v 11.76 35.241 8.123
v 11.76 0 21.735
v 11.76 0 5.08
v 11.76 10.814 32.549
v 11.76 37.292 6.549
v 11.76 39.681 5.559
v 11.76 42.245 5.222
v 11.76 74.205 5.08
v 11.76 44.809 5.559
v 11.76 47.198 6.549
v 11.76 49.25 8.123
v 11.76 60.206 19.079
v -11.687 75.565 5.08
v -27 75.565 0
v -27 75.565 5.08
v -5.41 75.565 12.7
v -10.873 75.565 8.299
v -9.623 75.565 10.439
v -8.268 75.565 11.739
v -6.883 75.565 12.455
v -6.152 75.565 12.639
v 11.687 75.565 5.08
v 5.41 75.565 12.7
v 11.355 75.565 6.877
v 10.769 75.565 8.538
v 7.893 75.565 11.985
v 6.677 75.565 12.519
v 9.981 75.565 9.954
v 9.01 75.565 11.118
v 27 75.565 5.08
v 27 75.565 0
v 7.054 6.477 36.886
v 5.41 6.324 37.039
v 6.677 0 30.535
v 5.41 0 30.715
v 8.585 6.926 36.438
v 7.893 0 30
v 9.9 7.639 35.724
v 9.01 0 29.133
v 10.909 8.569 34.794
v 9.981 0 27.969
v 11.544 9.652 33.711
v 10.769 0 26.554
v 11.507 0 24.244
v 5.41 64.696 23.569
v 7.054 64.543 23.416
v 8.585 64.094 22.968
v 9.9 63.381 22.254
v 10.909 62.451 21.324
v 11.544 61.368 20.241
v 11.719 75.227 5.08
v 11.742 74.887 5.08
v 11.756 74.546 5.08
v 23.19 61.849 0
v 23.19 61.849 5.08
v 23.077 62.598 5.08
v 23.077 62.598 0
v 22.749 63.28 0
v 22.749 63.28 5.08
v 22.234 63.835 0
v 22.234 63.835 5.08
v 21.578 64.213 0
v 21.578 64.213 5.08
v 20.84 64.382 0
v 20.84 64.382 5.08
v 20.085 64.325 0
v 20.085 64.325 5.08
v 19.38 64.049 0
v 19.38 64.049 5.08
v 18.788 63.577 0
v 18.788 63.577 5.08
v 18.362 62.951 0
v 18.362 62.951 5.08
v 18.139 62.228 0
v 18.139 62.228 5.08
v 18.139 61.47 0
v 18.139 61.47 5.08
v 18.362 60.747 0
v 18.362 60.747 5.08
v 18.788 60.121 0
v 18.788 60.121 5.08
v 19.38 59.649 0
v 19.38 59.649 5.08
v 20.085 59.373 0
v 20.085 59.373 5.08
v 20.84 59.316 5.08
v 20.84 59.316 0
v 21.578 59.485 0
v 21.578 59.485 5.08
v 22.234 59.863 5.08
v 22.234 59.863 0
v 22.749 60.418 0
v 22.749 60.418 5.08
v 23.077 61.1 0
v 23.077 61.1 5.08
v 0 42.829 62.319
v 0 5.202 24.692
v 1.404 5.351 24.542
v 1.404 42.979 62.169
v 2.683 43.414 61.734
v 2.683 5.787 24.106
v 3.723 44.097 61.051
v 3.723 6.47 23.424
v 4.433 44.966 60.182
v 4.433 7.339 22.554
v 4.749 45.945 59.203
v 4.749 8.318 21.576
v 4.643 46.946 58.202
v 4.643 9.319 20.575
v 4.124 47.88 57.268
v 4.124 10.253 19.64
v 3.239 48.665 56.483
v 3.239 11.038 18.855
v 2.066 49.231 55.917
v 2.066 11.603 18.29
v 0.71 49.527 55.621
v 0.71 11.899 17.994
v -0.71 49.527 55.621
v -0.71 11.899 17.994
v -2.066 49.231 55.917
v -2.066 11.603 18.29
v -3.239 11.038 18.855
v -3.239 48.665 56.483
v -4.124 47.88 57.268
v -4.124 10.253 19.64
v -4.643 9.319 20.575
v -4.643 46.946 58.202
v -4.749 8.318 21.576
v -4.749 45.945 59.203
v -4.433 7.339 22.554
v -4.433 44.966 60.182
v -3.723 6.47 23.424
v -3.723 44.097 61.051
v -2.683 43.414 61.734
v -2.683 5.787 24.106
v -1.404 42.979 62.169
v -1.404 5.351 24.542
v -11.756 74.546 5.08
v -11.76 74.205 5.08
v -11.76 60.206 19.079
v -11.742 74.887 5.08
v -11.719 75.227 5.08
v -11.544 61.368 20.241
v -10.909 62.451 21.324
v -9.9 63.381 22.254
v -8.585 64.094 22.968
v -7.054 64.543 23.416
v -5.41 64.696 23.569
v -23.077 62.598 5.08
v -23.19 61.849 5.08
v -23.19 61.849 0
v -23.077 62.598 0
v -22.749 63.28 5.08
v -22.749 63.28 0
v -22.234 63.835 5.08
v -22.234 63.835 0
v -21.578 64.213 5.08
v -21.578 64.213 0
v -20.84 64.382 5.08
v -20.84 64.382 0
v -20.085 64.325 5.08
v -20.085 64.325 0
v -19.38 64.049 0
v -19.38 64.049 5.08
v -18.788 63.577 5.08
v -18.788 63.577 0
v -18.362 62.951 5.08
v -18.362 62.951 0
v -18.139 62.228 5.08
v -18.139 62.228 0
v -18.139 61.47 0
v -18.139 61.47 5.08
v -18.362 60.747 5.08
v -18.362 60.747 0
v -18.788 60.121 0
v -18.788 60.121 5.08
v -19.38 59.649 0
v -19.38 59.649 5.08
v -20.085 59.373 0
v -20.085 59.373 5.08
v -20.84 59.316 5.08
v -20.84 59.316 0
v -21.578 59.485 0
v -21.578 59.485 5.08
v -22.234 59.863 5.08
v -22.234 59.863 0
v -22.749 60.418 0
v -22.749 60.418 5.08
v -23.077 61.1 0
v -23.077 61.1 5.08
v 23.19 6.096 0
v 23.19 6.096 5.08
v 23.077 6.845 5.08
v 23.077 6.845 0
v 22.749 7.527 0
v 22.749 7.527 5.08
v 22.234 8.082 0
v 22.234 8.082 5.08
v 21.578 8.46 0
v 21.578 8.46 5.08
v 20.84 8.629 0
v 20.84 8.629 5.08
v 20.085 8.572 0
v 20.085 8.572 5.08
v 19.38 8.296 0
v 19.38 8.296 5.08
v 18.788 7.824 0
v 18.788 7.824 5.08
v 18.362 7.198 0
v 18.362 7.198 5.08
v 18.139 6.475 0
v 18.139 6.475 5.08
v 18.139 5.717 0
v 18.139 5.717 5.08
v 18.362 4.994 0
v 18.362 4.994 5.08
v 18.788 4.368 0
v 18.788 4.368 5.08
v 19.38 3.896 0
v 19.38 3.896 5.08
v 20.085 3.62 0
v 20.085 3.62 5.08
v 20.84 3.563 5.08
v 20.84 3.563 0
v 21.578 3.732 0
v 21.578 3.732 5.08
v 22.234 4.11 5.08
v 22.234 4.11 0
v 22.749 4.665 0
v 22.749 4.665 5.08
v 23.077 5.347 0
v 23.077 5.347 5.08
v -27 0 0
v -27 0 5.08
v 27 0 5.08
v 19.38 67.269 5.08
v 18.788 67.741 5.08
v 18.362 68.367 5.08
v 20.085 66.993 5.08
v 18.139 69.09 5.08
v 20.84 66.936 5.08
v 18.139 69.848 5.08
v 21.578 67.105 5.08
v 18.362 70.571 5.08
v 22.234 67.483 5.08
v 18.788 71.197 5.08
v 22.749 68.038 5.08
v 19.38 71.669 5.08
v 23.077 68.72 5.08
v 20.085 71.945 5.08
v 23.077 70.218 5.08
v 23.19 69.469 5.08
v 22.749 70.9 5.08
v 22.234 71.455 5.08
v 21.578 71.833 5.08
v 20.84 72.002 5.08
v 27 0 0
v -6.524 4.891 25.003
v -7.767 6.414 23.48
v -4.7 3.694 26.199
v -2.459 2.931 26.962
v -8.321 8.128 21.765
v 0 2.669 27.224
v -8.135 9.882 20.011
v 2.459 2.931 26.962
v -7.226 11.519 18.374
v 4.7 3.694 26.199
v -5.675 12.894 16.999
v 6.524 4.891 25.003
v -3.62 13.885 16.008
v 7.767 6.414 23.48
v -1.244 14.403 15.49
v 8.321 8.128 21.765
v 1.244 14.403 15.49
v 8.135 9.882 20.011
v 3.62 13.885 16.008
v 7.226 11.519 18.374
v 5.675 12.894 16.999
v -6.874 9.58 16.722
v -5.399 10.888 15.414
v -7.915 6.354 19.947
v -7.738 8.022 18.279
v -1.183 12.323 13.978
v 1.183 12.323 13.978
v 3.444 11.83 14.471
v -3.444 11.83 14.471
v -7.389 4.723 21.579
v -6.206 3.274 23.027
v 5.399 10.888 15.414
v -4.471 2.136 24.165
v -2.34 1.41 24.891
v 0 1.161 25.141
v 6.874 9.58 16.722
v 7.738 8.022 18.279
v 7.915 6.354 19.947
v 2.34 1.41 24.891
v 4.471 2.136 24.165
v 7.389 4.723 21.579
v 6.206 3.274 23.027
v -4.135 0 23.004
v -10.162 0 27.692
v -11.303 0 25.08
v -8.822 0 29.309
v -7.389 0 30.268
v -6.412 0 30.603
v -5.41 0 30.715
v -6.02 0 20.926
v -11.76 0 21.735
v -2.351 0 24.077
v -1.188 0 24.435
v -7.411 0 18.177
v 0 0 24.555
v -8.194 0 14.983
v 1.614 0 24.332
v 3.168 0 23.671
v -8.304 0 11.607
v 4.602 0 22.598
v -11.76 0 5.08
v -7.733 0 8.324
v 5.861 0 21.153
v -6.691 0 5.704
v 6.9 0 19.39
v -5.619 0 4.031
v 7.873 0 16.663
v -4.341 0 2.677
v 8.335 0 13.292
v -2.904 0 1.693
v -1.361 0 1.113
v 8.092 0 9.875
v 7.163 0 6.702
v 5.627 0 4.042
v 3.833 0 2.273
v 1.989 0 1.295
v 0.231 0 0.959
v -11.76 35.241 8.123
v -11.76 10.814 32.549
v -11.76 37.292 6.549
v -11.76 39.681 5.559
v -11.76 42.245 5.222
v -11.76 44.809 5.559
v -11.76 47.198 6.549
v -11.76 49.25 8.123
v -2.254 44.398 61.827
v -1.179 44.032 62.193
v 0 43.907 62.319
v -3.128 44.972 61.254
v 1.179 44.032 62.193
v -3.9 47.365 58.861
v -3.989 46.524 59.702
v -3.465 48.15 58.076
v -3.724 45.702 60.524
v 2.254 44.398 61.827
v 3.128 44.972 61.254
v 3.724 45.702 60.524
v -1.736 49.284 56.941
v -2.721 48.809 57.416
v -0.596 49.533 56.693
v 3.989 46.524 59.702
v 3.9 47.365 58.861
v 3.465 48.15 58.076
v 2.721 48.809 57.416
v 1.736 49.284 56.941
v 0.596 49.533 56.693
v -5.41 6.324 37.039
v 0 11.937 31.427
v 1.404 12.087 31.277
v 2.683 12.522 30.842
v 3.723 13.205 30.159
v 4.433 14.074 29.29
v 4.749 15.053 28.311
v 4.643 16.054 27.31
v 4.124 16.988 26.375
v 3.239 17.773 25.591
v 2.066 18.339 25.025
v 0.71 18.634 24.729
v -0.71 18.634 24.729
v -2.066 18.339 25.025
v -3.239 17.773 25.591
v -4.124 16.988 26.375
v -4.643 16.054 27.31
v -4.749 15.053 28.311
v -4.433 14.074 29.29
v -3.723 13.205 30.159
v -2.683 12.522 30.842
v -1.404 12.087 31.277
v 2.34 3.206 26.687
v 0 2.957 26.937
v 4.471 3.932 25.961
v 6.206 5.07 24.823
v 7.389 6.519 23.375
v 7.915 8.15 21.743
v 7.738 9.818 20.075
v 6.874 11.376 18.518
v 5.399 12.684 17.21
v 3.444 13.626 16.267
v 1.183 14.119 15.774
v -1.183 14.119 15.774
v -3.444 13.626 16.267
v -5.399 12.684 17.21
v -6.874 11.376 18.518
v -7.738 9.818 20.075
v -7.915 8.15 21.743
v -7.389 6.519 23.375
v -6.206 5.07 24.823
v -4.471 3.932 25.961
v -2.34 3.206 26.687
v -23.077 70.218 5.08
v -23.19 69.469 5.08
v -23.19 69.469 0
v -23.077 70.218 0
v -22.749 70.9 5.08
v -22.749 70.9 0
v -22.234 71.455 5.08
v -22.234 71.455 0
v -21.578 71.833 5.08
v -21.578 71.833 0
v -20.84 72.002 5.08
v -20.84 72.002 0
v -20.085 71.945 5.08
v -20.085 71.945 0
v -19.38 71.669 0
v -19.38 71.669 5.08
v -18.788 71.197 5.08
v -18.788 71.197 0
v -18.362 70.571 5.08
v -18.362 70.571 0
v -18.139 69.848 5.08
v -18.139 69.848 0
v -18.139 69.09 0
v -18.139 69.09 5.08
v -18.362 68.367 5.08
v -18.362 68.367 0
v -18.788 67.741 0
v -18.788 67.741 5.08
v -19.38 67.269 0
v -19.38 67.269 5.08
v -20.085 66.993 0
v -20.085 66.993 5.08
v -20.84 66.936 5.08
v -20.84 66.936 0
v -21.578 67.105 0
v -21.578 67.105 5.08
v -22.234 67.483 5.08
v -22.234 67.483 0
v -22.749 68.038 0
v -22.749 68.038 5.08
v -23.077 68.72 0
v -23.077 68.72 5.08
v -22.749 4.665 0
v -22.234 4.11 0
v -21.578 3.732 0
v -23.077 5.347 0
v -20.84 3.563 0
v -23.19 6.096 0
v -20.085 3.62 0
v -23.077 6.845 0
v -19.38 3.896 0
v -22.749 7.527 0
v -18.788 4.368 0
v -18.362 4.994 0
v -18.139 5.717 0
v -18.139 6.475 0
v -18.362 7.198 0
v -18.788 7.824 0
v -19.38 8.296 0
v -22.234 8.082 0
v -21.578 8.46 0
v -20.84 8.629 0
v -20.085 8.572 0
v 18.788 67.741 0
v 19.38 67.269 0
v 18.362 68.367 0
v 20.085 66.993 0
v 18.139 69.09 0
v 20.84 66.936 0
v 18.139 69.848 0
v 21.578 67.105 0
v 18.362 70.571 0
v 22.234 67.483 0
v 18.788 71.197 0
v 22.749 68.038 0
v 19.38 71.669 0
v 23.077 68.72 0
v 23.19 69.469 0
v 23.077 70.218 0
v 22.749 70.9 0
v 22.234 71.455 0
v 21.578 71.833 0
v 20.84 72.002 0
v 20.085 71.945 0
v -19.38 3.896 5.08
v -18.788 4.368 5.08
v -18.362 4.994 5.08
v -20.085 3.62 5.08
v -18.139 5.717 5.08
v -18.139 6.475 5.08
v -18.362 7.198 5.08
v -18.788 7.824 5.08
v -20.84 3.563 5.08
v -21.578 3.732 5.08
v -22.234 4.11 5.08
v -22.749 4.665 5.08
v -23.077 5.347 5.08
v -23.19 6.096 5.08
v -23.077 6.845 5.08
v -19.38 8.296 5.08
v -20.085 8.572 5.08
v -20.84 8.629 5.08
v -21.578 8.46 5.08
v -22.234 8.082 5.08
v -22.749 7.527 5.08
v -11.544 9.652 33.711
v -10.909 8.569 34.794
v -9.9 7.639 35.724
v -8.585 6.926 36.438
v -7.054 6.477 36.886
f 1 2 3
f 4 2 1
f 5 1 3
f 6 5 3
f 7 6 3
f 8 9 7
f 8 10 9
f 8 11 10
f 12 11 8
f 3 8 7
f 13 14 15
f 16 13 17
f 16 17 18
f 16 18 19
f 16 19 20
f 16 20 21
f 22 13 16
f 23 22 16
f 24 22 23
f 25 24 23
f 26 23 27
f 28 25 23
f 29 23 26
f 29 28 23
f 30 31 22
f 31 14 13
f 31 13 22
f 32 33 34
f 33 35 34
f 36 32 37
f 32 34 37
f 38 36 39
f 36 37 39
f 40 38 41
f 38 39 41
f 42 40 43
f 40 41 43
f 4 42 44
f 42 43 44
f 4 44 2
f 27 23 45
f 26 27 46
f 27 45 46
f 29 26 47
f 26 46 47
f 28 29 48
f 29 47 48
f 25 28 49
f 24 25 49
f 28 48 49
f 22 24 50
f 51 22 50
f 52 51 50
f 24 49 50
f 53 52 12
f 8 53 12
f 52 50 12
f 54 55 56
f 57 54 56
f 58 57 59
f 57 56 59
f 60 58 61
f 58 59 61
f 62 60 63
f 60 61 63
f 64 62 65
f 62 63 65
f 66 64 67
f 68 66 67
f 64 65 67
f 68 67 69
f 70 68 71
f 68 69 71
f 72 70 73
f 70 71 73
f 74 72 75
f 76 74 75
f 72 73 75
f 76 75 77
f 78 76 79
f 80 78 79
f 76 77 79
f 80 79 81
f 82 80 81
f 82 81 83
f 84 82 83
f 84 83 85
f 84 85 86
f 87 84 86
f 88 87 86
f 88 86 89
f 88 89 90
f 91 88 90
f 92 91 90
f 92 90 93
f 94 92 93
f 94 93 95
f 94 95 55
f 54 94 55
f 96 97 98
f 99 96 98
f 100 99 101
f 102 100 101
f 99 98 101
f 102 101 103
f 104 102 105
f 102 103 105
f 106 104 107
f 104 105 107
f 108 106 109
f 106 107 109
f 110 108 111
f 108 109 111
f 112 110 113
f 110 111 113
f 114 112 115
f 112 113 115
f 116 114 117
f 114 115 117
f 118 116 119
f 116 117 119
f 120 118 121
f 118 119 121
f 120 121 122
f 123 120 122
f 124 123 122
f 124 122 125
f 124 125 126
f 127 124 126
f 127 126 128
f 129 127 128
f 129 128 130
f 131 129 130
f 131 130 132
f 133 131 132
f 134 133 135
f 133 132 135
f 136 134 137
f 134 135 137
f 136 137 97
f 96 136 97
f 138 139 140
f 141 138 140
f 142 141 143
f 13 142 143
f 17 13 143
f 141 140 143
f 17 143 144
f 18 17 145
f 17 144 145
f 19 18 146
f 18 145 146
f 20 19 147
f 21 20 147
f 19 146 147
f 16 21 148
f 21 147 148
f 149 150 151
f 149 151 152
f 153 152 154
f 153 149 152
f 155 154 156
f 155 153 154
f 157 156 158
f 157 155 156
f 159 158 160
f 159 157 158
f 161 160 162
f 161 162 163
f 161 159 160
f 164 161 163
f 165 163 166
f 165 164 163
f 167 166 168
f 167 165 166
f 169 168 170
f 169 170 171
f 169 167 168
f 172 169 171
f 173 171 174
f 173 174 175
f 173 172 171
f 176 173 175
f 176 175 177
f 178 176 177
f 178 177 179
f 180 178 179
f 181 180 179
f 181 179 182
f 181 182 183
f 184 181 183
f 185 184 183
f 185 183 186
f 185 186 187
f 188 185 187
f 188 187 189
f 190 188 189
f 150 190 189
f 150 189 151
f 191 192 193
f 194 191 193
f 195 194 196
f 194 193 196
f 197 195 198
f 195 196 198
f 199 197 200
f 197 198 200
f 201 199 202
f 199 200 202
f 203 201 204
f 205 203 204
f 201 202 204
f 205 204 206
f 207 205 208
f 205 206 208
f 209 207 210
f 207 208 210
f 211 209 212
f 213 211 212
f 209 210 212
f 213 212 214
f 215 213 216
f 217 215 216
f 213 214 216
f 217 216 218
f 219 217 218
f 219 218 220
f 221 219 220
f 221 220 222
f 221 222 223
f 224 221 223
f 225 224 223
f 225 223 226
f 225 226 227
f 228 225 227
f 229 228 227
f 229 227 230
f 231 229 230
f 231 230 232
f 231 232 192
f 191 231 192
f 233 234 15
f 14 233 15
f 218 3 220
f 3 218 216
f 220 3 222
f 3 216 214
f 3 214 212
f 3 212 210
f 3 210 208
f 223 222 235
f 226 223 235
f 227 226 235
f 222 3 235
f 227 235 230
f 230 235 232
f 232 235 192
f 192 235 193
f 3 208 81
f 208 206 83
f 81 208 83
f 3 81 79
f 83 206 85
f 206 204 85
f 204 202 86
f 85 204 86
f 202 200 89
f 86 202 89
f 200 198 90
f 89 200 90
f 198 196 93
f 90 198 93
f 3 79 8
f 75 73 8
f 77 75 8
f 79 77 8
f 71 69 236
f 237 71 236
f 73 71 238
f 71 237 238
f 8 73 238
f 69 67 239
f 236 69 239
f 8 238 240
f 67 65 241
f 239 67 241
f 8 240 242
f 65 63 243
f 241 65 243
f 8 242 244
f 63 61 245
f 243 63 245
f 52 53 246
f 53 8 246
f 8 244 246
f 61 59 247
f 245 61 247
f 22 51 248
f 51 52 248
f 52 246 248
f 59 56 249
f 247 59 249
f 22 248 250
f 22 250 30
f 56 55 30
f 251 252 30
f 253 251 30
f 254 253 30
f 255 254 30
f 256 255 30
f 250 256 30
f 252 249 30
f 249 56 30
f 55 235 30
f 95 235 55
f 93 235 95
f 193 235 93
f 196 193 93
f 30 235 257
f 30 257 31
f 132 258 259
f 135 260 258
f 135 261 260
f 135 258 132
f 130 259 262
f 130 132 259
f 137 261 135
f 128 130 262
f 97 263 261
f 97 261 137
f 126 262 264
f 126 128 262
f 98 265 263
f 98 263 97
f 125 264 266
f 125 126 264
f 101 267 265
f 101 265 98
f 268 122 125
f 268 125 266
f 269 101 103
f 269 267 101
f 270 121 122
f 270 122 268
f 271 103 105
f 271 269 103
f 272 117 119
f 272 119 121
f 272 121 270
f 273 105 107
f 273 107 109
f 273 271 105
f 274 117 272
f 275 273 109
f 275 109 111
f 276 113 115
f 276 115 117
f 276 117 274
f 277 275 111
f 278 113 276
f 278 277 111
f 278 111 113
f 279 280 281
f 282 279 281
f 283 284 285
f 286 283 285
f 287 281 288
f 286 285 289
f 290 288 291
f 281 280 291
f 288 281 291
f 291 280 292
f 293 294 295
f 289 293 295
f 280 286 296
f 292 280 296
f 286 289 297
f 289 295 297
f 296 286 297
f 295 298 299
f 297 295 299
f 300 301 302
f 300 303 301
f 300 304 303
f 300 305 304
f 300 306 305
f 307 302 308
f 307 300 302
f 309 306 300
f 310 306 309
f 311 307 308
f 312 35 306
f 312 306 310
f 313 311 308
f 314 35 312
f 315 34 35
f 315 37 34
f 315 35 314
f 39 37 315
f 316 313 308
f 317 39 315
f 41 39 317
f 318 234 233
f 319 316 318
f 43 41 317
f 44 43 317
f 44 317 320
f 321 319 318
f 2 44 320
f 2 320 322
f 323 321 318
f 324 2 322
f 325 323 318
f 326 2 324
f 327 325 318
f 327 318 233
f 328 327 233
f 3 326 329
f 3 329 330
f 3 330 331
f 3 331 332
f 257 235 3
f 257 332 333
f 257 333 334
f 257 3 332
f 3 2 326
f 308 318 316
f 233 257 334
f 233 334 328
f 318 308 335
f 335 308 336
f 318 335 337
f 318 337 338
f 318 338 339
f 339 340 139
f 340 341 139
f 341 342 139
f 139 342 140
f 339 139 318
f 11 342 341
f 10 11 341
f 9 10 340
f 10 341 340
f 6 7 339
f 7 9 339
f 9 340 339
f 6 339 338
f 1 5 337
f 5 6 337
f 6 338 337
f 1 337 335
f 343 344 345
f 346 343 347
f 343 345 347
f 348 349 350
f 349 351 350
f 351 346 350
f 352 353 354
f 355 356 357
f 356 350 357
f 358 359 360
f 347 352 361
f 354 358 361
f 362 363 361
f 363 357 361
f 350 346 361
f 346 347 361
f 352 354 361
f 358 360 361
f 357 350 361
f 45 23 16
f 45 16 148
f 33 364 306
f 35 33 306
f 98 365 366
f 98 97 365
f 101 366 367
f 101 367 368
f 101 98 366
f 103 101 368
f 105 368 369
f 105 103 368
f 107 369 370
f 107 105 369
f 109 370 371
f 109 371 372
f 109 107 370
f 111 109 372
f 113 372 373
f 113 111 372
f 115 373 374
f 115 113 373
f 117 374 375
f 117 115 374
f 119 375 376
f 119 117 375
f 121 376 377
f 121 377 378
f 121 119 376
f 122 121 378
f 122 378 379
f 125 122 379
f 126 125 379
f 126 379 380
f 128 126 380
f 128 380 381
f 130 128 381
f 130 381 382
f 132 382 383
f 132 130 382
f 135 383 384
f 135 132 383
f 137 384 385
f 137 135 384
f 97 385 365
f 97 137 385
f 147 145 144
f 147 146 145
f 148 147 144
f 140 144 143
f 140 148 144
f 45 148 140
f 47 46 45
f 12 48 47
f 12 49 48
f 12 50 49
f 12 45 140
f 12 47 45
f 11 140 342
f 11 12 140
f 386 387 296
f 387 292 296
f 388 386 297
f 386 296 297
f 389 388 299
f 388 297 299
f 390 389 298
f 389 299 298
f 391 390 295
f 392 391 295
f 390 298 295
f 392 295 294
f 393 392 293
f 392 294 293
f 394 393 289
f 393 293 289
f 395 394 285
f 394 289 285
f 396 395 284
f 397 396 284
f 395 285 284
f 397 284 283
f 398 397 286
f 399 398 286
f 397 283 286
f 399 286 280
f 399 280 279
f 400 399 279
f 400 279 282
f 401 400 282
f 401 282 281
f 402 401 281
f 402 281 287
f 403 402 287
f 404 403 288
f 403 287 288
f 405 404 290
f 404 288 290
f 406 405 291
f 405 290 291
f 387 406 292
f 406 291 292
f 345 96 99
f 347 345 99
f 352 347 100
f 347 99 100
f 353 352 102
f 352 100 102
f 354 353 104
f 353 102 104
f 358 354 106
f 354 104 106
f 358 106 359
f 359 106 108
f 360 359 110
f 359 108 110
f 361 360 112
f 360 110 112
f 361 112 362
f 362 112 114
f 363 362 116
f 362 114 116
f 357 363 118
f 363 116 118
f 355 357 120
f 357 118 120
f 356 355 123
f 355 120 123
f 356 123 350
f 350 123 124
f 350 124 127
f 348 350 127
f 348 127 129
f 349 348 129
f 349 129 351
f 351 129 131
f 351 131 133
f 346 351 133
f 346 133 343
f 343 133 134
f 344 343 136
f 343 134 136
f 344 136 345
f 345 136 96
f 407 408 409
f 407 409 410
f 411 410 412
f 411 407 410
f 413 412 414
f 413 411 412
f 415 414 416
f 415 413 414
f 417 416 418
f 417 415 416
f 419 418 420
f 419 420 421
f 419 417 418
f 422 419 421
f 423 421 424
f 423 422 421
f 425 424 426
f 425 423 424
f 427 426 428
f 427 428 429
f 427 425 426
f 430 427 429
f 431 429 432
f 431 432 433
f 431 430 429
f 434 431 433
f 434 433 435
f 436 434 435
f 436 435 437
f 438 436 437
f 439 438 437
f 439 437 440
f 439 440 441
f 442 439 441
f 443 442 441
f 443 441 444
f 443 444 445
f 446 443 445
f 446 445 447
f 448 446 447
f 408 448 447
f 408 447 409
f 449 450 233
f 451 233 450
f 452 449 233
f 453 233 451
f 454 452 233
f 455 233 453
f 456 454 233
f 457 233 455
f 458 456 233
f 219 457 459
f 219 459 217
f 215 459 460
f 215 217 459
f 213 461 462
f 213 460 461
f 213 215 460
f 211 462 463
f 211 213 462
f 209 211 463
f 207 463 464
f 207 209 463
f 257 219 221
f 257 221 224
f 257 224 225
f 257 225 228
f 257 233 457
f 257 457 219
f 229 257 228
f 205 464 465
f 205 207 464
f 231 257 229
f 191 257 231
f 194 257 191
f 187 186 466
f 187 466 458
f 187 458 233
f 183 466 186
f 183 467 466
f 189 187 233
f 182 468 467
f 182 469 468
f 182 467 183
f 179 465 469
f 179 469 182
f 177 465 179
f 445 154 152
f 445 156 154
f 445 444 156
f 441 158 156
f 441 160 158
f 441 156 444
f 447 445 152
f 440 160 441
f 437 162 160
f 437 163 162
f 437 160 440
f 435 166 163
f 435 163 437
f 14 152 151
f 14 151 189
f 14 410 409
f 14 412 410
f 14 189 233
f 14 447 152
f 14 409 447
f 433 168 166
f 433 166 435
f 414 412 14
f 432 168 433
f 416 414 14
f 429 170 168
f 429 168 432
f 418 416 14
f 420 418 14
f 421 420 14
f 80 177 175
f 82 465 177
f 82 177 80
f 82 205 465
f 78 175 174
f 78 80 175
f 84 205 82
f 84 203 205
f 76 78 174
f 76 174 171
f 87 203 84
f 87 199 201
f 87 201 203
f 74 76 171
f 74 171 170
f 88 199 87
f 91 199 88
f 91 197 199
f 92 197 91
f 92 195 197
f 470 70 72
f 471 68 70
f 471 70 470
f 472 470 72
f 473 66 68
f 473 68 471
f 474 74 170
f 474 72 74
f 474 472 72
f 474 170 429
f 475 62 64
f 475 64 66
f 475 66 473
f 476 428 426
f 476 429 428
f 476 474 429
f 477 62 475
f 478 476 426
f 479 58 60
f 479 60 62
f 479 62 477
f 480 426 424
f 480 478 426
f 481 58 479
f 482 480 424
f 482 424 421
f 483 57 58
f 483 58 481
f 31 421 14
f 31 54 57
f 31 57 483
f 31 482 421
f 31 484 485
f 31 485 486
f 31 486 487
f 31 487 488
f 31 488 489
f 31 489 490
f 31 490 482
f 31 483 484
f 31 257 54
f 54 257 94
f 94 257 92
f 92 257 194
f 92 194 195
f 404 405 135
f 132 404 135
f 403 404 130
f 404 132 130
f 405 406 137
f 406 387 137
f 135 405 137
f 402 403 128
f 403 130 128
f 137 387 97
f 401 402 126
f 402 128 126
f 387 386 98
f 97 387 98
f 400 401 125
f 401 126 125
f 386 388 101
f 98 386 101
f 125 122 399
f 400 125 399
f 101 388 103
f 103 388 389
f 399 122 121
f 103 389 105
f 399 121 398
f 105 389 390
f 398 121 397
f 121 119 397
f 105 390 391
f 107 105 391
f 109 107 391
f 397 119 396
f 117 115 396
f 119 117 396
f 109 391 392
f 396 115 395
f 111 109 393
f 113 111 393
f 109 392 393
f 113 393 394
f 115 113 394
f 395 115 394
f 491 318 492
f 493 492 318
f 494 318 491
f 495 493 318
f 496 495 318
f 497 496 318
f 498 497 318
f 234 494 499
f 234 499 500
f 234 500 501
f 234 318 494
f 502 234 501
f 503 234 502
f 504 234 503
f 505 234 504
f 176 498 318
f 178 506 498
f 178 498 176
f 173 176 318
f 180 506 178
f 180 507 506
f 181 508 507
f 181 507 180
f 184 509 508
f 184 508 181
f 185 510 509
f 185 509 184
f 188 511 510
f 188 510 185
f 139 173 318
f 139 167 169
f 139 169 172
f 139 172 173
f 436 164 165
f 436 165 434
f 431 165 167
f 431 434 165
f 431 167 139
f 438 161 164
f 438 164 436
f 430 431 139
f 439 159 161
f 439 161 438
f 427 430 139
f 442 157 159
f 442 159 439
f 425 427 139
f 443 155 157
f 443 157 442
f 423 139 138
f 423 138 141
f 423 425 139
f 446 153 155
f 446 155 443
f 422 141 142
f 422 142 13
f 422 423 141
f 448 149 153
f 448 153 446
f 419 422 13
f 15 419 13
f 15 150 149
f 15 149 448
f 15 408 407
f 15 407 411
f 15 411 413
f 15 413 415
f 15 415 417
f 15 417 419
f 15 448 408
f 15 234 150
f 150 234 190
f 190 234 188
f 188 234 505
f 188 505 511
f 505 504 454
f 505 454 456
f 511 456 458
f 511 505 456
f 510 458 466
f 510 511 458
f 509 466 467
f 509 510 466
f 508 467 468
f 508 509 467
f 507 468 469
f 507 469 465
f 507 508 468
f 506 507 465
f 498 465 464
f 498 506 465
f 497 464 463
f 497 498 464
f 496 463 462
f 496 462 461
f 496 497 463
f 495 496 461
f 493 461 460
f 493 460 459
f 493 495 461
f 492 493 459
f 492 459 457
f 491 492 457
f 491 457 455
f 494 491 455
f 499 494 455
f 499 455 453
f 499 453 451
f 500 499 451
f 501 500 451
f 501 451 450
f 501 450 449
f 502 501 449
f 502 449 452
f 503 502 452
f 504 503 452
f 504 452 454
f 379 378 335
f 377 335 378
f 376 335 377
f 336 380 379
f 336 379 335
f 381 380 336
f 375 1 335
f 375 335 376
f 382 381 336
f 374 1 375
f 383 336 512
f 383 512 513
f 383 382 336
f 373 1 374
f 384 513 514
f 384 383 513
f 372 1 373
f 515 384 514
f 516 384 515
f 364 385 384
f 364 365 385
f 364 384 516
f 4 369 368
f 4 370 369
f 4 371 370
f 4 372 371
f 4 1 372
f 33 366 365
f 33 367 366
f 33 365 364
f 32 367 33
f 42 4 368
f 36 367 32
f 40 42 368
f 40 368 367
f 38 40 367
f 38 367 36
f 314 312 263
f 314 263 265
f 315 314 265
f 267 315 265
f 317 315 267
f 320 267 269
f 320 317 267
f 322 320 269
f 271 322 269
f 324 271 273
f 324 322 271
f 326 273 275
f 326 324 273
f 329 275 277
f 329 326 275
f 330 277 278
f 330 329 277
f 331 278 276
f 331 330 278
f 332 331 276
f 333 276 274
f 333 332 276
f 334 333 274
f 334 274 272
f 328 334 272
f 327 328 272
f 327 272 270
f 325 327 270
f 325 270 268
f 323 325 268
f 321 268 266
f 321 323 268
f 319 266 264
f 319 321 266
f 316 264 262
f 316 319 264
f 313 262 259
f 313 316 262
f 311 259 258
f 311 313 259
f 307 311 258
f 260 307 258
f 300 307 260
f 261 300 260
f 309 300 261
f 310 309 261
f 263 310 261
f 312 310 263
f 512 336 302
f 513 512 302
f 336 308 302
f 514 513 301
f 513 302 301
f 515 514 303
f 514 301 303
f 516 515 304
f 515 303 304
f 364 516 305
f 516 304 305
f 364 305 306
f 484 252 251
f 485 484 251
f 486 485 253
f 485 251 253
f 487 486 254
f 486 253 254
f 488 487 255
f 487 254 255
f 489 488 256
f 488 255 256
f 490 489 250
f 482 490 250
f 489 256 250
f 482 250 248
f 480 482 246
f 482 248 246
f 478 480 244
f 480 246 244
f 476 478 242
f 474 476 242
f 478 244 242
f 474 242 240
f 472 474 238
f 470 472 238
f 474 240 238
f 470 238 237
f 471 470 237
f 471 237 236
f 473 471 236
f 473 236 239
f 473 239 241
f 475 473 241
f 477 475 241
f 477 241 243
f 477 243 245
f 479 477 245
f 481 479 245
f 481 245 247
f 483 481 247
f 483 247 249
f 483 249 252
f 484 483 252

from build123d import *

# Parameters (mm, degrees)
F1_DEPTH = 27.0002
F2_R     = 9.906
F3_W     = 75.565
F3_H     = 31.9594877579
F4_DEPTH = 15.24
F5_R     = 2.54
F6_DEPTH = 5.081
F8_R     = 6.35
F13_SIZE = 0.762


with BuildPart() as f1:
    # F0 (on Right) → F1 (new body)
    with BuildSketch(Plane.YZ):
        Polygon((0, 30.7152561211), (0, 0), (75.565, 0), (75.565, 12.7), (64.6958964237, 23.5691035763), (42.2452561211, 1.1184632736), (6.3242316368, 37.0394877579), align=None)
    extrude(amount=F1_DEPTH)

    # F2
    f2_edges = [f1.edges().sort_by_distance(p)[0] for p in [
        (13.5001, 42.245256, 1.118463),
    ]]
    fillet(f2_edges, radius=F2_R)

    # F3 (on face) → F4 (cut)
    with BuildSketch(Plane.YZ.offset(27.0002)):
        with Locations((37.7825, 21.0597438789)):
            Rectangle(F3_W, F3_H)
    extrude(amount=-F4_DEPTH, mode=Mode.SUBTRACT)

    # F5 (on face) → F6 (cut, through all)
    with BuildSketch(Plane.XY.offset(5.08)):
        with Locations((20.6502, 69.469)):
            Circle(F5_R)
        with Locations((20.6502, 61.849)):
            Circle(F5_R)
        with Locations((20.6502, 6.096)):
            Circle(F5_R)
    extrude(amount=-F6_DEPTH, mode=Mode.SUBTRACT)

    # F7: F1 across face


with BuildPart() as f1_1:
    add(f1.part)
    add(f1.part.mirror(Plane(origin=(0, 31.4337361572, 11.6287579026), x_dir=(0, 1, 0), z_dir=(-1, 0, 0))))

    # F8
    f8_edges = [f1_1.edges().sort_by_distance(p)[0] for p in [
        (-11.7602, 3.162116, 33.877372),
        (11.7602, 3.162116, 33.877372),
        (-11.7602, 70.130448, 18.134552),
        (11.7602, 70.130448, 18.134552),
    ]]
    fillet(f8_edges, radius=F8_R)

    # F9 (on Right) → F10 (revolve, cut)
    with BuildSketch(Plane.YZ):
        Polygon((15.3044877579, 28.0592316368), (11.9368917125, 31.4268276822), (5.2016996217, 24.6916355914), (2.6692673955, 27.2240678175), (-12.277400211, 12.277400211), (-6.3773719395, 6.3773719395), align=None)
    revolve(axis=Axis((0, 22.0396798487, 34.7944237276), (0, 0.7071067812, 0.7071067812)), mode=Mode.SUBTRACT)


with BuildPart() as f12:
    # F11 (on Right) → F12 (revolve)
    with BuildSketch(Plane.YZ):
        Polygon((11.9368917125, 31.4268276822), (5.2016996217, 24.6916355914), (2.9566355914, 26.9366996217), (1.1605843672, 25.1406483974), (6.7732444428, 19.5279883218), (46.7353841816, 59.4901280605), (43.3677881362, 62.8577241059), align=None)
    revolve(axis=Axis((0, 26.7543143122, 39.5090581912), (0, 0.7071067812, 0.7071067812)))

    # F13
    f13_edges = [f12.edges().sort_by_distance(p)[0] for p in [
        (0, 50.10298, 56.122532),
    ]]
    chamfer(f13_edges, length=F13_SIZE)


solid = Compound([f1_1.part, f12.part])
